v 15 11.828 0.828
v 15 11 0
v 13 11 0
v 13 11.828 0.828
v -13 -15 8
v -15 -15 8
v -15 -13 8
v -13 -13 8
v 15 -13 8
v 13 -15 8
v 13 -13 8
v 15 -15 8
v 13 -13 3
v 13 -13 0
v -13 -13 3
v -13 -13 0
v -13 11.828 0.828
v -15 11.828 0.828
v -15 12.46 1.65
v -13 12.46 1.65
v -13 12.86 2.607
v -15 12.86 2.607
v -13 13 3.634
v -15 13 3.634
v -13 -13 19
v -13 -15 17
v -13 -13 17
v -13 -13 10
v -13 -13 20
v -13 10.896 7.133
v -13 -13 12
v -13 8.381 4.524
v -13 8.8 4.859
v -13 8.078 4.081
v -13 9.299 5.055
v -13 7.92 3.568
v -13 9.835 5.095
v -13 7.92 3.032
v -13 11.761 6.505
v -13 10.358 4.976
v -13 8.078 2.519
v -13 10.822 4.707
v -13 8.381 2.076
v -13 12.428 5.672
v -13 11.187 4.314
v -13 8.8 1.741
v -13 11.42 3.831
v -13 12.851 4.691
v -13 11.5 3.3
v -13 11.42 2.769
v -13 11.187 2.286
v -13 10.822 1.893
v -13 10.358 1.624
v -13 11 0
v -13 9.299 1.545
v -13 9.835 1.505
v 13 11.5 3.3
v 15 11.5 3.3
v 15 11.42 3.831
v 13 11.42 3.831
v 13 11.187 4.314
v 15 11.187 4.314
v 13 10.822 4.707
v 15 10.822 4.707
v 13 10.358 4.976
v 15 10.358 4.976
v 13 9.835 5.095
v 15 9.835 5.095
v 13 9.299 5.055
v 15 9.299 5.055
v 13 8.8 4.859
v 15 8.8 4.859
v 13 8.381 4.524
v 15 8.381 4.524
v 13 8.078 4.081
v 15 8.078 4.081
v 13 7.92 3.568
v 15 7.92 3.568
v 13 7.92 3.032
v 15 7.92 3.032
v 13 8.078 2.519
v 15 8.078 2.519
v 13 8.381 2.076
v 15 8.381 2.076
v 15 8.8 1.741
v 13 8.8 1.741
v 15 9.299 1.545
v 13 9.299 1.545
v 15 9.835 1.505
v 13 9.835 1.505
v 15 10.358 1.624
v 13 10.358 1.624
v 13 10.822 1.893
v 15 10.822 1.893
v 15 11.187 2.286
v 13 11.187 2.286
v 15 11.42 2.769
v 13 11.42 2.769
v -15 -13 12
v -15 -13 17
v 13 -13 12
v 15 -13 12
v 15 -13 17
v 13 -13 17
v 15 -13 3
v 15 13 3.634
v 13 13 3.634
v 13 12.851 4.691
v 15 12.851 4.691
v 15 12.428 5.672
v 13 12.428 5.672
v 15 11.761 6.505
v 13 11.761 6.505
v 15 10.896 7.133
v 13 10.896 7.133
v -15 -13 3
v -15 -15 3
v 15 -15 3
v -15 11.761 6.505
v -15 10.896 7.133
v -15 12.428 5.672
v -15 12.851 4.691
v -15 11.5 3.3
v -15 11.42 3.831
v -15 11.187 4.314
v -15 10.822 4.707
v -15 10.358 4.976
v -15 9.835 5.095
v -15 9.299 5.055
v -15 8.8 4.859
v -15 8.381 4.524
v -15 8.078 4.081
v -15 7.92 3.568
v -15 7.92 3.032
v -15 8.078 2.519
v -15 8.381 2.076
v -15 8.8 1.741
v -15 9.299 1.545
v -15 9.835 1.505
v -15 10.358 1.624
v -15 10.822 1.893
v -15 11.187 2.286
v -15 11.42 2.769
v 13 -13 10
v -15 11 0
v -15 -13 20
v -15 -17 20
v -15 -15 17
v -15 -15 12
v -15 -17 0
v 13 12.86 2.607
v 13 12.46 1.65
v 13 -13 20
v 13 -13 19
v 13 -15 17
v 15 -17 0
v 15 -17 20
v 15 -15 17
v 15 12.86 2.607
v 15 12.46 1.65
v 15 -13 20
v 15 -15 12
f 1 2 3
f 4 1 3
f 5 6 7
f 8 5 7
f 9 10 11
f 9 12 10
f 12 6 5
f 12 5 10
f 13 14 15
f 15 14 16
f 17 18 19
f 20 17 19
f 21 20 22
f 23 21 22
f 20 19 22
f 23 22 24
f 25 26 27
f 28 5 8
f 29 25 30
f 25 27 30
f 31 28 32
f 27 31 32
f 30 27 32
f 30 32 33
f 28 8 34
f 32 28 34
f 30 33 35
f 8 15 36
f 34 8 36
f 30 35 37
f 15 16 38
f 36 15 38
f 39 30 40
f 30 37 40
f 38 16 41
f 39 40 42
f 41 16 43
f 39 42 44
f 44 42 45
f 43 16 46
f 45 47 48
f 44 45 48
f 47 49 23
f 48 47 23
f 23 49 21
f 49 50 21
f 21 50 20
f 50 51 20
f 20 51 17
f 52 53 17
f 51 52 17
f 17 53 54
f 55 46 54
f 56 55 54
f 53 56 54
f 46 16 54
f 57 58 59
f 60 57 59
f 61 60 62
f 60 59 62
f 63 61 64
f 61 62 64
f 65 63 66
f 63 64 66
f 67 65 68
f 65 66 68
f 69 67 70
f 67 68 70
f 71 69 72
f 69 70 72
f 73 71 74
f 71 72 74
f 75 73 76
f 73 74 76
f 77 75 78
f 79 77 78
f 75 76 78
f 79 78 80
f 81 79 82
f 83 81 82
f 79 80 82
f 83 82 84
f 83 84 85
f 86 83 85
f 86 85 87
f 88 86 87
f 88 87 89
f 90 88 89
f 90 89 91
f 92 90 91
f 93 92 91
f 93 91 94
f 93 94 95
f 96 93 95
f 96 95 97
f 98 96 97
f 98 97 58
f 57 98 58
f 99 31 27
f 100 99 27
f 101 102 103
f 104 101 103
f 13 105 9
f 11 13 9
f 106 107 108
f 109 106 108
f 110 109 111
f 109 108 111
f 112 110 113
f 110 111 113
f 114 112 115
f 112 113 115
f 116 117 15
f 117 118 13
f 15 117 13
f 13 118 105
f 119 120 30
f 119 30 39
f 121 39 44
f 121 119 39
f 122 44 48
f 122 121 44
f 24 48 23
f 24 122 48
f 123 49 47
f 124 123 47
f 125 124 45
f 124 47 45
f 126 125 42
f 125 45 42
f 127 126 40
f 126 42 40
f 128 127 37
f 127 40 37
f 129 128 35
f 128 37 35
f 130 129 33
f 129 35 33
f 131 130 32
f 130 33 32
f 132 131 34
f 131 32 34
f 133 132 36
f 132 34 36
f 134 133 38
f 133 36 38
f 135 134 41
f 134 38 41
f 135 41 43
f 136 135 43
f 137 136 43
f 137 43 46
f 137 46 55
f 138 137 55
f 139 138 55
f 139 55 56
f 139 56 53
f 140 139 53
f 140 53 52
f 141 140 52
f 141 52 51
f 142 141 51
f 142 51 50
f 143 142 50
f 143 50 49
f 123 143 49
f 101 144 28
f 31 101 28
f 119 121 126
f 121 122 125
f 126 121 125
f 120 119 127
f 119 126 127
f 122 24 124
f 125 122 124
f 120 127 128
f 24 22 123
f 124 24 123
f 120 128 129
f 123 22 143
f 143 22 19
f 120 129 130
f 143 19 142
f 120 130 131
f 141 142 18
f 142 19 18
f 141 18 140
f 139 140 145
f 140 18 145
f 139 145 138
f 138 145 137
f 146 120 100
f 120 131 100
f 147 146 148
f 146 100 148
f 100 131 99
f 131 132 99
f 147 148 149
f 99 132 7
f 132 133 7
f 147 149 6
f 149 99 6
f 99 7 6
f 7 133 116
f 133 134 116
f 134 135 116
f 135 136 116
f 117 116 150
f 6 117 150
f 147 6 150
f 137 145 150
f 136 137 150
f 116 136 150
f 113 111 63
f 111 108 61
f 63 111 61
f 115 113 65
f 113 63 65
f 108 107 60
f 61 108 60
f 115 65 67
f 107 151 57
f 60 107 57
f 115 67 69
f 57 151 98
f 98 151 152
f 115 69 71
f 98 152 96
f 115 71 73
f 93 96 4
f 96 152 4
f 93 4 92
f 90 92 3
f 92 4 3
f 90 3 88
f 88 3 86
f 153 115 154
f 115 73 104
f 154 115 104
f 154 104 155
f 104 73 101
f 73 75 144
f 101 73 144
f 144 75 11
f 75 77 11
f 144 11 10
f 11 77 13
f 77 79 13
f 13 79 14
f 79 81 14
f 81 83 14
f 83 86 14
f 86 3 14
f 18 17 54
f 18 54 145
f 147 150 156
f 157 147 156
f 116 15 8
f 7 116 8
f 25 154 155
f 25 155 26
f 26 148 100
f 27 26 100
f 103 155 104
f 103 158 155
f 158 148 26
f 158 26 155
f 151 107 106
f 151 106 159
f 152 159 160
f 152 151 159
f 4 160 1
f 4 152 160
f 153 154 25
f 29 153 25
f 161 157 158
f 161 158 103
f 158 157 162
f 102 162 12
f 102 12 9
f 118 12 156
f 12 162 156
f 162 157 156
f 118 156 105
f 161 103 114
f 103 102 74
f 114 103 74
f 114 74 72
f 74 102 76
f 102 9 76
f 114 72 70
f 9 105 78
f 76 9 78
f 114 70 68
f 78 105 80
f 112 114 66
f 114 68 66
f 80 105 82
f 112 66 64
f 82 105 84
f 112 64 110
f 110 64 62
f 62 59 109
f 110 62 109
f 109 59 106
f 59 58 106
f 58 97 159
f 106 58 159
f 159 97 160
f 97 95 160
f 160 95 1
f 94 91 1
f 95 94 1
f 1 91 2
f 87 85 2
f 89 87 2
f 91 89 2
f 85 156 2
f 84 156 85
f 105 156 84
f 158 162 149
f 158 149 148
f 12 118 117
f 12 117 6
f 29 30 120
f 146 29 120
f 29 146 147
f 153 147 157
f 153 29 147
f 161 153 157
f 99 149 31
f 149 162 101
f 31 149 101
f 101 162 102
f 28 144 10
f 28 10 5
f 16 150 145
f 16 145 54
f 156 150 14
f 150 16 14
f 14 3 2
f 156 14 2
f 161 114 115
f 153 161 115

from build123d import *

# Parameters (mm, degrees)
F1_DEPTH    = 20
F2_R        = 1.8
F3_DEPTH    = 30.001
F4_SIZE2    = 14
F4_SIZE     = 26
F5_SIZE     = 2
F6_R        = 4
F7_T1_DEPTH = 13.9458816311
F7_T3_DEPTH = 13.9458816311
F8_W        = 2
F8_H        = 5
F9_DEPTH    = 30.001
F10_SIZE    = 1.99999


# Not quite as in the source:
# - a fillet or chamfer that OpenCascade refuses, or shapes differently, is made with other operations: its cross-section is extruded or revolved along the edge and cut away or added
# - a fillet or chamfer is up to 0.001 mm smaller than in the source, because OpenCascade refuses the exact size


with BuildPart() as f1:
    # F0 (on Top) → F1 (new body)
    with BuildSketch(Plane.XY):
        Polygon((15, 13), (13, 13), (13, -13), (-13, -13), (-13, 13), (-15, 13), (-15, -17), (15, -17), align=None)
    extrude(amount=F1_DEPTH)

    # F2 (on face) → F3 (cut, through all)
    with BuildSketch(Plane.YZ.offset(15)):
        with Locations((9.7, 3.3)):
            Circle(F2_R)
    extrude(amount=-F3_DEPTH, mode=Mode.SUBTRACT)

    # F4
    f4_edges = [f1.edges().sort_by_distance(p)[0] for p in [
        (14, 13, 20),
        (-14, 13, 20),
    ]]
    f4_side = f1.faces().sort_by_distance((14, 12.575736, 20))[0]
    chamfer(f4_edges, length=F4_SIZE, length2=F4_SIZE2, reference=f4_side)

    # F5
    f5_edges = [f1.edges().sort_by_distance(p)[0] for p in [
        (14, 13, 0),
        (-14, 13, 0),
    ]]
    chamfer(f5_edges, length=F5_SIZE)

    # F6
    f6_edges = [f1.edges().sort_by_distance(p)[0] for p in [
        (14, 13, 2),
        (-14, 13, 2),
    ]]
    fillet(f6_edges, radius=F6_R)

    # F7: fillet of radius 4 on 2 edges, made by hand

    # F7_s2 → F7_t1 (cut)
    with BuildSketch(Plane.YZ.offset(7.0270591844)):
        with BuildLine():
            ThreePointArc((13, 3.6108236738), (12.4340644409, 5.66197004), (10.8963992921, 7.1327080735))
            Line((10.8963992921, 7.1327080735), (13, 6))
            Line((13, 6), (13, 3.6108236738))
        make_face()
    extrude(amount=F7_T1_DEPTH, mode=Mode.SUBTRACT)

    # F7_s4 → F7_t3 (cut)
    with BuildSketch(Plane.YZ.offset(-20.9729408156)):
        with BuildLine():
            ThreePointArc((10.8963992921, 7.1327080735), (12.4340644409, 5.66197004), (13, 3.6108236738))
            Line((13, 3.6108236738), (13, 6))
            Line((13, 6), (10.8963992921, 7.1327080735))
        make_face()
    extrude(amount=F7_T3_DEPTH, mode=Mode.SUBTRACT)

    # F8 (on face) → F9 (cut, through all)
    with BuildSketch(Plane.YZ.offset(15)):
        with Locations((-14, 14.5)):
            Rectangle(F8_W, F8_H)
        with Locations((-14, 5.5)):
            Rectangle(F8_W, F8_H)
    extrude(amount=-F9_DEPTH, mode=Mode.SUBTRACT)

    # F10 (size 2 in the source; OpenCascade refuses exactly that, so slightly less here)
    f10_edges = [f1.edges().sort_by_distance(p)[0] for p in [
        (0, -13, 8),
        (0, -13, 17),
    ]]
    chamfer(f10_edges, length=F10_SIZE)


solid = f1.part
